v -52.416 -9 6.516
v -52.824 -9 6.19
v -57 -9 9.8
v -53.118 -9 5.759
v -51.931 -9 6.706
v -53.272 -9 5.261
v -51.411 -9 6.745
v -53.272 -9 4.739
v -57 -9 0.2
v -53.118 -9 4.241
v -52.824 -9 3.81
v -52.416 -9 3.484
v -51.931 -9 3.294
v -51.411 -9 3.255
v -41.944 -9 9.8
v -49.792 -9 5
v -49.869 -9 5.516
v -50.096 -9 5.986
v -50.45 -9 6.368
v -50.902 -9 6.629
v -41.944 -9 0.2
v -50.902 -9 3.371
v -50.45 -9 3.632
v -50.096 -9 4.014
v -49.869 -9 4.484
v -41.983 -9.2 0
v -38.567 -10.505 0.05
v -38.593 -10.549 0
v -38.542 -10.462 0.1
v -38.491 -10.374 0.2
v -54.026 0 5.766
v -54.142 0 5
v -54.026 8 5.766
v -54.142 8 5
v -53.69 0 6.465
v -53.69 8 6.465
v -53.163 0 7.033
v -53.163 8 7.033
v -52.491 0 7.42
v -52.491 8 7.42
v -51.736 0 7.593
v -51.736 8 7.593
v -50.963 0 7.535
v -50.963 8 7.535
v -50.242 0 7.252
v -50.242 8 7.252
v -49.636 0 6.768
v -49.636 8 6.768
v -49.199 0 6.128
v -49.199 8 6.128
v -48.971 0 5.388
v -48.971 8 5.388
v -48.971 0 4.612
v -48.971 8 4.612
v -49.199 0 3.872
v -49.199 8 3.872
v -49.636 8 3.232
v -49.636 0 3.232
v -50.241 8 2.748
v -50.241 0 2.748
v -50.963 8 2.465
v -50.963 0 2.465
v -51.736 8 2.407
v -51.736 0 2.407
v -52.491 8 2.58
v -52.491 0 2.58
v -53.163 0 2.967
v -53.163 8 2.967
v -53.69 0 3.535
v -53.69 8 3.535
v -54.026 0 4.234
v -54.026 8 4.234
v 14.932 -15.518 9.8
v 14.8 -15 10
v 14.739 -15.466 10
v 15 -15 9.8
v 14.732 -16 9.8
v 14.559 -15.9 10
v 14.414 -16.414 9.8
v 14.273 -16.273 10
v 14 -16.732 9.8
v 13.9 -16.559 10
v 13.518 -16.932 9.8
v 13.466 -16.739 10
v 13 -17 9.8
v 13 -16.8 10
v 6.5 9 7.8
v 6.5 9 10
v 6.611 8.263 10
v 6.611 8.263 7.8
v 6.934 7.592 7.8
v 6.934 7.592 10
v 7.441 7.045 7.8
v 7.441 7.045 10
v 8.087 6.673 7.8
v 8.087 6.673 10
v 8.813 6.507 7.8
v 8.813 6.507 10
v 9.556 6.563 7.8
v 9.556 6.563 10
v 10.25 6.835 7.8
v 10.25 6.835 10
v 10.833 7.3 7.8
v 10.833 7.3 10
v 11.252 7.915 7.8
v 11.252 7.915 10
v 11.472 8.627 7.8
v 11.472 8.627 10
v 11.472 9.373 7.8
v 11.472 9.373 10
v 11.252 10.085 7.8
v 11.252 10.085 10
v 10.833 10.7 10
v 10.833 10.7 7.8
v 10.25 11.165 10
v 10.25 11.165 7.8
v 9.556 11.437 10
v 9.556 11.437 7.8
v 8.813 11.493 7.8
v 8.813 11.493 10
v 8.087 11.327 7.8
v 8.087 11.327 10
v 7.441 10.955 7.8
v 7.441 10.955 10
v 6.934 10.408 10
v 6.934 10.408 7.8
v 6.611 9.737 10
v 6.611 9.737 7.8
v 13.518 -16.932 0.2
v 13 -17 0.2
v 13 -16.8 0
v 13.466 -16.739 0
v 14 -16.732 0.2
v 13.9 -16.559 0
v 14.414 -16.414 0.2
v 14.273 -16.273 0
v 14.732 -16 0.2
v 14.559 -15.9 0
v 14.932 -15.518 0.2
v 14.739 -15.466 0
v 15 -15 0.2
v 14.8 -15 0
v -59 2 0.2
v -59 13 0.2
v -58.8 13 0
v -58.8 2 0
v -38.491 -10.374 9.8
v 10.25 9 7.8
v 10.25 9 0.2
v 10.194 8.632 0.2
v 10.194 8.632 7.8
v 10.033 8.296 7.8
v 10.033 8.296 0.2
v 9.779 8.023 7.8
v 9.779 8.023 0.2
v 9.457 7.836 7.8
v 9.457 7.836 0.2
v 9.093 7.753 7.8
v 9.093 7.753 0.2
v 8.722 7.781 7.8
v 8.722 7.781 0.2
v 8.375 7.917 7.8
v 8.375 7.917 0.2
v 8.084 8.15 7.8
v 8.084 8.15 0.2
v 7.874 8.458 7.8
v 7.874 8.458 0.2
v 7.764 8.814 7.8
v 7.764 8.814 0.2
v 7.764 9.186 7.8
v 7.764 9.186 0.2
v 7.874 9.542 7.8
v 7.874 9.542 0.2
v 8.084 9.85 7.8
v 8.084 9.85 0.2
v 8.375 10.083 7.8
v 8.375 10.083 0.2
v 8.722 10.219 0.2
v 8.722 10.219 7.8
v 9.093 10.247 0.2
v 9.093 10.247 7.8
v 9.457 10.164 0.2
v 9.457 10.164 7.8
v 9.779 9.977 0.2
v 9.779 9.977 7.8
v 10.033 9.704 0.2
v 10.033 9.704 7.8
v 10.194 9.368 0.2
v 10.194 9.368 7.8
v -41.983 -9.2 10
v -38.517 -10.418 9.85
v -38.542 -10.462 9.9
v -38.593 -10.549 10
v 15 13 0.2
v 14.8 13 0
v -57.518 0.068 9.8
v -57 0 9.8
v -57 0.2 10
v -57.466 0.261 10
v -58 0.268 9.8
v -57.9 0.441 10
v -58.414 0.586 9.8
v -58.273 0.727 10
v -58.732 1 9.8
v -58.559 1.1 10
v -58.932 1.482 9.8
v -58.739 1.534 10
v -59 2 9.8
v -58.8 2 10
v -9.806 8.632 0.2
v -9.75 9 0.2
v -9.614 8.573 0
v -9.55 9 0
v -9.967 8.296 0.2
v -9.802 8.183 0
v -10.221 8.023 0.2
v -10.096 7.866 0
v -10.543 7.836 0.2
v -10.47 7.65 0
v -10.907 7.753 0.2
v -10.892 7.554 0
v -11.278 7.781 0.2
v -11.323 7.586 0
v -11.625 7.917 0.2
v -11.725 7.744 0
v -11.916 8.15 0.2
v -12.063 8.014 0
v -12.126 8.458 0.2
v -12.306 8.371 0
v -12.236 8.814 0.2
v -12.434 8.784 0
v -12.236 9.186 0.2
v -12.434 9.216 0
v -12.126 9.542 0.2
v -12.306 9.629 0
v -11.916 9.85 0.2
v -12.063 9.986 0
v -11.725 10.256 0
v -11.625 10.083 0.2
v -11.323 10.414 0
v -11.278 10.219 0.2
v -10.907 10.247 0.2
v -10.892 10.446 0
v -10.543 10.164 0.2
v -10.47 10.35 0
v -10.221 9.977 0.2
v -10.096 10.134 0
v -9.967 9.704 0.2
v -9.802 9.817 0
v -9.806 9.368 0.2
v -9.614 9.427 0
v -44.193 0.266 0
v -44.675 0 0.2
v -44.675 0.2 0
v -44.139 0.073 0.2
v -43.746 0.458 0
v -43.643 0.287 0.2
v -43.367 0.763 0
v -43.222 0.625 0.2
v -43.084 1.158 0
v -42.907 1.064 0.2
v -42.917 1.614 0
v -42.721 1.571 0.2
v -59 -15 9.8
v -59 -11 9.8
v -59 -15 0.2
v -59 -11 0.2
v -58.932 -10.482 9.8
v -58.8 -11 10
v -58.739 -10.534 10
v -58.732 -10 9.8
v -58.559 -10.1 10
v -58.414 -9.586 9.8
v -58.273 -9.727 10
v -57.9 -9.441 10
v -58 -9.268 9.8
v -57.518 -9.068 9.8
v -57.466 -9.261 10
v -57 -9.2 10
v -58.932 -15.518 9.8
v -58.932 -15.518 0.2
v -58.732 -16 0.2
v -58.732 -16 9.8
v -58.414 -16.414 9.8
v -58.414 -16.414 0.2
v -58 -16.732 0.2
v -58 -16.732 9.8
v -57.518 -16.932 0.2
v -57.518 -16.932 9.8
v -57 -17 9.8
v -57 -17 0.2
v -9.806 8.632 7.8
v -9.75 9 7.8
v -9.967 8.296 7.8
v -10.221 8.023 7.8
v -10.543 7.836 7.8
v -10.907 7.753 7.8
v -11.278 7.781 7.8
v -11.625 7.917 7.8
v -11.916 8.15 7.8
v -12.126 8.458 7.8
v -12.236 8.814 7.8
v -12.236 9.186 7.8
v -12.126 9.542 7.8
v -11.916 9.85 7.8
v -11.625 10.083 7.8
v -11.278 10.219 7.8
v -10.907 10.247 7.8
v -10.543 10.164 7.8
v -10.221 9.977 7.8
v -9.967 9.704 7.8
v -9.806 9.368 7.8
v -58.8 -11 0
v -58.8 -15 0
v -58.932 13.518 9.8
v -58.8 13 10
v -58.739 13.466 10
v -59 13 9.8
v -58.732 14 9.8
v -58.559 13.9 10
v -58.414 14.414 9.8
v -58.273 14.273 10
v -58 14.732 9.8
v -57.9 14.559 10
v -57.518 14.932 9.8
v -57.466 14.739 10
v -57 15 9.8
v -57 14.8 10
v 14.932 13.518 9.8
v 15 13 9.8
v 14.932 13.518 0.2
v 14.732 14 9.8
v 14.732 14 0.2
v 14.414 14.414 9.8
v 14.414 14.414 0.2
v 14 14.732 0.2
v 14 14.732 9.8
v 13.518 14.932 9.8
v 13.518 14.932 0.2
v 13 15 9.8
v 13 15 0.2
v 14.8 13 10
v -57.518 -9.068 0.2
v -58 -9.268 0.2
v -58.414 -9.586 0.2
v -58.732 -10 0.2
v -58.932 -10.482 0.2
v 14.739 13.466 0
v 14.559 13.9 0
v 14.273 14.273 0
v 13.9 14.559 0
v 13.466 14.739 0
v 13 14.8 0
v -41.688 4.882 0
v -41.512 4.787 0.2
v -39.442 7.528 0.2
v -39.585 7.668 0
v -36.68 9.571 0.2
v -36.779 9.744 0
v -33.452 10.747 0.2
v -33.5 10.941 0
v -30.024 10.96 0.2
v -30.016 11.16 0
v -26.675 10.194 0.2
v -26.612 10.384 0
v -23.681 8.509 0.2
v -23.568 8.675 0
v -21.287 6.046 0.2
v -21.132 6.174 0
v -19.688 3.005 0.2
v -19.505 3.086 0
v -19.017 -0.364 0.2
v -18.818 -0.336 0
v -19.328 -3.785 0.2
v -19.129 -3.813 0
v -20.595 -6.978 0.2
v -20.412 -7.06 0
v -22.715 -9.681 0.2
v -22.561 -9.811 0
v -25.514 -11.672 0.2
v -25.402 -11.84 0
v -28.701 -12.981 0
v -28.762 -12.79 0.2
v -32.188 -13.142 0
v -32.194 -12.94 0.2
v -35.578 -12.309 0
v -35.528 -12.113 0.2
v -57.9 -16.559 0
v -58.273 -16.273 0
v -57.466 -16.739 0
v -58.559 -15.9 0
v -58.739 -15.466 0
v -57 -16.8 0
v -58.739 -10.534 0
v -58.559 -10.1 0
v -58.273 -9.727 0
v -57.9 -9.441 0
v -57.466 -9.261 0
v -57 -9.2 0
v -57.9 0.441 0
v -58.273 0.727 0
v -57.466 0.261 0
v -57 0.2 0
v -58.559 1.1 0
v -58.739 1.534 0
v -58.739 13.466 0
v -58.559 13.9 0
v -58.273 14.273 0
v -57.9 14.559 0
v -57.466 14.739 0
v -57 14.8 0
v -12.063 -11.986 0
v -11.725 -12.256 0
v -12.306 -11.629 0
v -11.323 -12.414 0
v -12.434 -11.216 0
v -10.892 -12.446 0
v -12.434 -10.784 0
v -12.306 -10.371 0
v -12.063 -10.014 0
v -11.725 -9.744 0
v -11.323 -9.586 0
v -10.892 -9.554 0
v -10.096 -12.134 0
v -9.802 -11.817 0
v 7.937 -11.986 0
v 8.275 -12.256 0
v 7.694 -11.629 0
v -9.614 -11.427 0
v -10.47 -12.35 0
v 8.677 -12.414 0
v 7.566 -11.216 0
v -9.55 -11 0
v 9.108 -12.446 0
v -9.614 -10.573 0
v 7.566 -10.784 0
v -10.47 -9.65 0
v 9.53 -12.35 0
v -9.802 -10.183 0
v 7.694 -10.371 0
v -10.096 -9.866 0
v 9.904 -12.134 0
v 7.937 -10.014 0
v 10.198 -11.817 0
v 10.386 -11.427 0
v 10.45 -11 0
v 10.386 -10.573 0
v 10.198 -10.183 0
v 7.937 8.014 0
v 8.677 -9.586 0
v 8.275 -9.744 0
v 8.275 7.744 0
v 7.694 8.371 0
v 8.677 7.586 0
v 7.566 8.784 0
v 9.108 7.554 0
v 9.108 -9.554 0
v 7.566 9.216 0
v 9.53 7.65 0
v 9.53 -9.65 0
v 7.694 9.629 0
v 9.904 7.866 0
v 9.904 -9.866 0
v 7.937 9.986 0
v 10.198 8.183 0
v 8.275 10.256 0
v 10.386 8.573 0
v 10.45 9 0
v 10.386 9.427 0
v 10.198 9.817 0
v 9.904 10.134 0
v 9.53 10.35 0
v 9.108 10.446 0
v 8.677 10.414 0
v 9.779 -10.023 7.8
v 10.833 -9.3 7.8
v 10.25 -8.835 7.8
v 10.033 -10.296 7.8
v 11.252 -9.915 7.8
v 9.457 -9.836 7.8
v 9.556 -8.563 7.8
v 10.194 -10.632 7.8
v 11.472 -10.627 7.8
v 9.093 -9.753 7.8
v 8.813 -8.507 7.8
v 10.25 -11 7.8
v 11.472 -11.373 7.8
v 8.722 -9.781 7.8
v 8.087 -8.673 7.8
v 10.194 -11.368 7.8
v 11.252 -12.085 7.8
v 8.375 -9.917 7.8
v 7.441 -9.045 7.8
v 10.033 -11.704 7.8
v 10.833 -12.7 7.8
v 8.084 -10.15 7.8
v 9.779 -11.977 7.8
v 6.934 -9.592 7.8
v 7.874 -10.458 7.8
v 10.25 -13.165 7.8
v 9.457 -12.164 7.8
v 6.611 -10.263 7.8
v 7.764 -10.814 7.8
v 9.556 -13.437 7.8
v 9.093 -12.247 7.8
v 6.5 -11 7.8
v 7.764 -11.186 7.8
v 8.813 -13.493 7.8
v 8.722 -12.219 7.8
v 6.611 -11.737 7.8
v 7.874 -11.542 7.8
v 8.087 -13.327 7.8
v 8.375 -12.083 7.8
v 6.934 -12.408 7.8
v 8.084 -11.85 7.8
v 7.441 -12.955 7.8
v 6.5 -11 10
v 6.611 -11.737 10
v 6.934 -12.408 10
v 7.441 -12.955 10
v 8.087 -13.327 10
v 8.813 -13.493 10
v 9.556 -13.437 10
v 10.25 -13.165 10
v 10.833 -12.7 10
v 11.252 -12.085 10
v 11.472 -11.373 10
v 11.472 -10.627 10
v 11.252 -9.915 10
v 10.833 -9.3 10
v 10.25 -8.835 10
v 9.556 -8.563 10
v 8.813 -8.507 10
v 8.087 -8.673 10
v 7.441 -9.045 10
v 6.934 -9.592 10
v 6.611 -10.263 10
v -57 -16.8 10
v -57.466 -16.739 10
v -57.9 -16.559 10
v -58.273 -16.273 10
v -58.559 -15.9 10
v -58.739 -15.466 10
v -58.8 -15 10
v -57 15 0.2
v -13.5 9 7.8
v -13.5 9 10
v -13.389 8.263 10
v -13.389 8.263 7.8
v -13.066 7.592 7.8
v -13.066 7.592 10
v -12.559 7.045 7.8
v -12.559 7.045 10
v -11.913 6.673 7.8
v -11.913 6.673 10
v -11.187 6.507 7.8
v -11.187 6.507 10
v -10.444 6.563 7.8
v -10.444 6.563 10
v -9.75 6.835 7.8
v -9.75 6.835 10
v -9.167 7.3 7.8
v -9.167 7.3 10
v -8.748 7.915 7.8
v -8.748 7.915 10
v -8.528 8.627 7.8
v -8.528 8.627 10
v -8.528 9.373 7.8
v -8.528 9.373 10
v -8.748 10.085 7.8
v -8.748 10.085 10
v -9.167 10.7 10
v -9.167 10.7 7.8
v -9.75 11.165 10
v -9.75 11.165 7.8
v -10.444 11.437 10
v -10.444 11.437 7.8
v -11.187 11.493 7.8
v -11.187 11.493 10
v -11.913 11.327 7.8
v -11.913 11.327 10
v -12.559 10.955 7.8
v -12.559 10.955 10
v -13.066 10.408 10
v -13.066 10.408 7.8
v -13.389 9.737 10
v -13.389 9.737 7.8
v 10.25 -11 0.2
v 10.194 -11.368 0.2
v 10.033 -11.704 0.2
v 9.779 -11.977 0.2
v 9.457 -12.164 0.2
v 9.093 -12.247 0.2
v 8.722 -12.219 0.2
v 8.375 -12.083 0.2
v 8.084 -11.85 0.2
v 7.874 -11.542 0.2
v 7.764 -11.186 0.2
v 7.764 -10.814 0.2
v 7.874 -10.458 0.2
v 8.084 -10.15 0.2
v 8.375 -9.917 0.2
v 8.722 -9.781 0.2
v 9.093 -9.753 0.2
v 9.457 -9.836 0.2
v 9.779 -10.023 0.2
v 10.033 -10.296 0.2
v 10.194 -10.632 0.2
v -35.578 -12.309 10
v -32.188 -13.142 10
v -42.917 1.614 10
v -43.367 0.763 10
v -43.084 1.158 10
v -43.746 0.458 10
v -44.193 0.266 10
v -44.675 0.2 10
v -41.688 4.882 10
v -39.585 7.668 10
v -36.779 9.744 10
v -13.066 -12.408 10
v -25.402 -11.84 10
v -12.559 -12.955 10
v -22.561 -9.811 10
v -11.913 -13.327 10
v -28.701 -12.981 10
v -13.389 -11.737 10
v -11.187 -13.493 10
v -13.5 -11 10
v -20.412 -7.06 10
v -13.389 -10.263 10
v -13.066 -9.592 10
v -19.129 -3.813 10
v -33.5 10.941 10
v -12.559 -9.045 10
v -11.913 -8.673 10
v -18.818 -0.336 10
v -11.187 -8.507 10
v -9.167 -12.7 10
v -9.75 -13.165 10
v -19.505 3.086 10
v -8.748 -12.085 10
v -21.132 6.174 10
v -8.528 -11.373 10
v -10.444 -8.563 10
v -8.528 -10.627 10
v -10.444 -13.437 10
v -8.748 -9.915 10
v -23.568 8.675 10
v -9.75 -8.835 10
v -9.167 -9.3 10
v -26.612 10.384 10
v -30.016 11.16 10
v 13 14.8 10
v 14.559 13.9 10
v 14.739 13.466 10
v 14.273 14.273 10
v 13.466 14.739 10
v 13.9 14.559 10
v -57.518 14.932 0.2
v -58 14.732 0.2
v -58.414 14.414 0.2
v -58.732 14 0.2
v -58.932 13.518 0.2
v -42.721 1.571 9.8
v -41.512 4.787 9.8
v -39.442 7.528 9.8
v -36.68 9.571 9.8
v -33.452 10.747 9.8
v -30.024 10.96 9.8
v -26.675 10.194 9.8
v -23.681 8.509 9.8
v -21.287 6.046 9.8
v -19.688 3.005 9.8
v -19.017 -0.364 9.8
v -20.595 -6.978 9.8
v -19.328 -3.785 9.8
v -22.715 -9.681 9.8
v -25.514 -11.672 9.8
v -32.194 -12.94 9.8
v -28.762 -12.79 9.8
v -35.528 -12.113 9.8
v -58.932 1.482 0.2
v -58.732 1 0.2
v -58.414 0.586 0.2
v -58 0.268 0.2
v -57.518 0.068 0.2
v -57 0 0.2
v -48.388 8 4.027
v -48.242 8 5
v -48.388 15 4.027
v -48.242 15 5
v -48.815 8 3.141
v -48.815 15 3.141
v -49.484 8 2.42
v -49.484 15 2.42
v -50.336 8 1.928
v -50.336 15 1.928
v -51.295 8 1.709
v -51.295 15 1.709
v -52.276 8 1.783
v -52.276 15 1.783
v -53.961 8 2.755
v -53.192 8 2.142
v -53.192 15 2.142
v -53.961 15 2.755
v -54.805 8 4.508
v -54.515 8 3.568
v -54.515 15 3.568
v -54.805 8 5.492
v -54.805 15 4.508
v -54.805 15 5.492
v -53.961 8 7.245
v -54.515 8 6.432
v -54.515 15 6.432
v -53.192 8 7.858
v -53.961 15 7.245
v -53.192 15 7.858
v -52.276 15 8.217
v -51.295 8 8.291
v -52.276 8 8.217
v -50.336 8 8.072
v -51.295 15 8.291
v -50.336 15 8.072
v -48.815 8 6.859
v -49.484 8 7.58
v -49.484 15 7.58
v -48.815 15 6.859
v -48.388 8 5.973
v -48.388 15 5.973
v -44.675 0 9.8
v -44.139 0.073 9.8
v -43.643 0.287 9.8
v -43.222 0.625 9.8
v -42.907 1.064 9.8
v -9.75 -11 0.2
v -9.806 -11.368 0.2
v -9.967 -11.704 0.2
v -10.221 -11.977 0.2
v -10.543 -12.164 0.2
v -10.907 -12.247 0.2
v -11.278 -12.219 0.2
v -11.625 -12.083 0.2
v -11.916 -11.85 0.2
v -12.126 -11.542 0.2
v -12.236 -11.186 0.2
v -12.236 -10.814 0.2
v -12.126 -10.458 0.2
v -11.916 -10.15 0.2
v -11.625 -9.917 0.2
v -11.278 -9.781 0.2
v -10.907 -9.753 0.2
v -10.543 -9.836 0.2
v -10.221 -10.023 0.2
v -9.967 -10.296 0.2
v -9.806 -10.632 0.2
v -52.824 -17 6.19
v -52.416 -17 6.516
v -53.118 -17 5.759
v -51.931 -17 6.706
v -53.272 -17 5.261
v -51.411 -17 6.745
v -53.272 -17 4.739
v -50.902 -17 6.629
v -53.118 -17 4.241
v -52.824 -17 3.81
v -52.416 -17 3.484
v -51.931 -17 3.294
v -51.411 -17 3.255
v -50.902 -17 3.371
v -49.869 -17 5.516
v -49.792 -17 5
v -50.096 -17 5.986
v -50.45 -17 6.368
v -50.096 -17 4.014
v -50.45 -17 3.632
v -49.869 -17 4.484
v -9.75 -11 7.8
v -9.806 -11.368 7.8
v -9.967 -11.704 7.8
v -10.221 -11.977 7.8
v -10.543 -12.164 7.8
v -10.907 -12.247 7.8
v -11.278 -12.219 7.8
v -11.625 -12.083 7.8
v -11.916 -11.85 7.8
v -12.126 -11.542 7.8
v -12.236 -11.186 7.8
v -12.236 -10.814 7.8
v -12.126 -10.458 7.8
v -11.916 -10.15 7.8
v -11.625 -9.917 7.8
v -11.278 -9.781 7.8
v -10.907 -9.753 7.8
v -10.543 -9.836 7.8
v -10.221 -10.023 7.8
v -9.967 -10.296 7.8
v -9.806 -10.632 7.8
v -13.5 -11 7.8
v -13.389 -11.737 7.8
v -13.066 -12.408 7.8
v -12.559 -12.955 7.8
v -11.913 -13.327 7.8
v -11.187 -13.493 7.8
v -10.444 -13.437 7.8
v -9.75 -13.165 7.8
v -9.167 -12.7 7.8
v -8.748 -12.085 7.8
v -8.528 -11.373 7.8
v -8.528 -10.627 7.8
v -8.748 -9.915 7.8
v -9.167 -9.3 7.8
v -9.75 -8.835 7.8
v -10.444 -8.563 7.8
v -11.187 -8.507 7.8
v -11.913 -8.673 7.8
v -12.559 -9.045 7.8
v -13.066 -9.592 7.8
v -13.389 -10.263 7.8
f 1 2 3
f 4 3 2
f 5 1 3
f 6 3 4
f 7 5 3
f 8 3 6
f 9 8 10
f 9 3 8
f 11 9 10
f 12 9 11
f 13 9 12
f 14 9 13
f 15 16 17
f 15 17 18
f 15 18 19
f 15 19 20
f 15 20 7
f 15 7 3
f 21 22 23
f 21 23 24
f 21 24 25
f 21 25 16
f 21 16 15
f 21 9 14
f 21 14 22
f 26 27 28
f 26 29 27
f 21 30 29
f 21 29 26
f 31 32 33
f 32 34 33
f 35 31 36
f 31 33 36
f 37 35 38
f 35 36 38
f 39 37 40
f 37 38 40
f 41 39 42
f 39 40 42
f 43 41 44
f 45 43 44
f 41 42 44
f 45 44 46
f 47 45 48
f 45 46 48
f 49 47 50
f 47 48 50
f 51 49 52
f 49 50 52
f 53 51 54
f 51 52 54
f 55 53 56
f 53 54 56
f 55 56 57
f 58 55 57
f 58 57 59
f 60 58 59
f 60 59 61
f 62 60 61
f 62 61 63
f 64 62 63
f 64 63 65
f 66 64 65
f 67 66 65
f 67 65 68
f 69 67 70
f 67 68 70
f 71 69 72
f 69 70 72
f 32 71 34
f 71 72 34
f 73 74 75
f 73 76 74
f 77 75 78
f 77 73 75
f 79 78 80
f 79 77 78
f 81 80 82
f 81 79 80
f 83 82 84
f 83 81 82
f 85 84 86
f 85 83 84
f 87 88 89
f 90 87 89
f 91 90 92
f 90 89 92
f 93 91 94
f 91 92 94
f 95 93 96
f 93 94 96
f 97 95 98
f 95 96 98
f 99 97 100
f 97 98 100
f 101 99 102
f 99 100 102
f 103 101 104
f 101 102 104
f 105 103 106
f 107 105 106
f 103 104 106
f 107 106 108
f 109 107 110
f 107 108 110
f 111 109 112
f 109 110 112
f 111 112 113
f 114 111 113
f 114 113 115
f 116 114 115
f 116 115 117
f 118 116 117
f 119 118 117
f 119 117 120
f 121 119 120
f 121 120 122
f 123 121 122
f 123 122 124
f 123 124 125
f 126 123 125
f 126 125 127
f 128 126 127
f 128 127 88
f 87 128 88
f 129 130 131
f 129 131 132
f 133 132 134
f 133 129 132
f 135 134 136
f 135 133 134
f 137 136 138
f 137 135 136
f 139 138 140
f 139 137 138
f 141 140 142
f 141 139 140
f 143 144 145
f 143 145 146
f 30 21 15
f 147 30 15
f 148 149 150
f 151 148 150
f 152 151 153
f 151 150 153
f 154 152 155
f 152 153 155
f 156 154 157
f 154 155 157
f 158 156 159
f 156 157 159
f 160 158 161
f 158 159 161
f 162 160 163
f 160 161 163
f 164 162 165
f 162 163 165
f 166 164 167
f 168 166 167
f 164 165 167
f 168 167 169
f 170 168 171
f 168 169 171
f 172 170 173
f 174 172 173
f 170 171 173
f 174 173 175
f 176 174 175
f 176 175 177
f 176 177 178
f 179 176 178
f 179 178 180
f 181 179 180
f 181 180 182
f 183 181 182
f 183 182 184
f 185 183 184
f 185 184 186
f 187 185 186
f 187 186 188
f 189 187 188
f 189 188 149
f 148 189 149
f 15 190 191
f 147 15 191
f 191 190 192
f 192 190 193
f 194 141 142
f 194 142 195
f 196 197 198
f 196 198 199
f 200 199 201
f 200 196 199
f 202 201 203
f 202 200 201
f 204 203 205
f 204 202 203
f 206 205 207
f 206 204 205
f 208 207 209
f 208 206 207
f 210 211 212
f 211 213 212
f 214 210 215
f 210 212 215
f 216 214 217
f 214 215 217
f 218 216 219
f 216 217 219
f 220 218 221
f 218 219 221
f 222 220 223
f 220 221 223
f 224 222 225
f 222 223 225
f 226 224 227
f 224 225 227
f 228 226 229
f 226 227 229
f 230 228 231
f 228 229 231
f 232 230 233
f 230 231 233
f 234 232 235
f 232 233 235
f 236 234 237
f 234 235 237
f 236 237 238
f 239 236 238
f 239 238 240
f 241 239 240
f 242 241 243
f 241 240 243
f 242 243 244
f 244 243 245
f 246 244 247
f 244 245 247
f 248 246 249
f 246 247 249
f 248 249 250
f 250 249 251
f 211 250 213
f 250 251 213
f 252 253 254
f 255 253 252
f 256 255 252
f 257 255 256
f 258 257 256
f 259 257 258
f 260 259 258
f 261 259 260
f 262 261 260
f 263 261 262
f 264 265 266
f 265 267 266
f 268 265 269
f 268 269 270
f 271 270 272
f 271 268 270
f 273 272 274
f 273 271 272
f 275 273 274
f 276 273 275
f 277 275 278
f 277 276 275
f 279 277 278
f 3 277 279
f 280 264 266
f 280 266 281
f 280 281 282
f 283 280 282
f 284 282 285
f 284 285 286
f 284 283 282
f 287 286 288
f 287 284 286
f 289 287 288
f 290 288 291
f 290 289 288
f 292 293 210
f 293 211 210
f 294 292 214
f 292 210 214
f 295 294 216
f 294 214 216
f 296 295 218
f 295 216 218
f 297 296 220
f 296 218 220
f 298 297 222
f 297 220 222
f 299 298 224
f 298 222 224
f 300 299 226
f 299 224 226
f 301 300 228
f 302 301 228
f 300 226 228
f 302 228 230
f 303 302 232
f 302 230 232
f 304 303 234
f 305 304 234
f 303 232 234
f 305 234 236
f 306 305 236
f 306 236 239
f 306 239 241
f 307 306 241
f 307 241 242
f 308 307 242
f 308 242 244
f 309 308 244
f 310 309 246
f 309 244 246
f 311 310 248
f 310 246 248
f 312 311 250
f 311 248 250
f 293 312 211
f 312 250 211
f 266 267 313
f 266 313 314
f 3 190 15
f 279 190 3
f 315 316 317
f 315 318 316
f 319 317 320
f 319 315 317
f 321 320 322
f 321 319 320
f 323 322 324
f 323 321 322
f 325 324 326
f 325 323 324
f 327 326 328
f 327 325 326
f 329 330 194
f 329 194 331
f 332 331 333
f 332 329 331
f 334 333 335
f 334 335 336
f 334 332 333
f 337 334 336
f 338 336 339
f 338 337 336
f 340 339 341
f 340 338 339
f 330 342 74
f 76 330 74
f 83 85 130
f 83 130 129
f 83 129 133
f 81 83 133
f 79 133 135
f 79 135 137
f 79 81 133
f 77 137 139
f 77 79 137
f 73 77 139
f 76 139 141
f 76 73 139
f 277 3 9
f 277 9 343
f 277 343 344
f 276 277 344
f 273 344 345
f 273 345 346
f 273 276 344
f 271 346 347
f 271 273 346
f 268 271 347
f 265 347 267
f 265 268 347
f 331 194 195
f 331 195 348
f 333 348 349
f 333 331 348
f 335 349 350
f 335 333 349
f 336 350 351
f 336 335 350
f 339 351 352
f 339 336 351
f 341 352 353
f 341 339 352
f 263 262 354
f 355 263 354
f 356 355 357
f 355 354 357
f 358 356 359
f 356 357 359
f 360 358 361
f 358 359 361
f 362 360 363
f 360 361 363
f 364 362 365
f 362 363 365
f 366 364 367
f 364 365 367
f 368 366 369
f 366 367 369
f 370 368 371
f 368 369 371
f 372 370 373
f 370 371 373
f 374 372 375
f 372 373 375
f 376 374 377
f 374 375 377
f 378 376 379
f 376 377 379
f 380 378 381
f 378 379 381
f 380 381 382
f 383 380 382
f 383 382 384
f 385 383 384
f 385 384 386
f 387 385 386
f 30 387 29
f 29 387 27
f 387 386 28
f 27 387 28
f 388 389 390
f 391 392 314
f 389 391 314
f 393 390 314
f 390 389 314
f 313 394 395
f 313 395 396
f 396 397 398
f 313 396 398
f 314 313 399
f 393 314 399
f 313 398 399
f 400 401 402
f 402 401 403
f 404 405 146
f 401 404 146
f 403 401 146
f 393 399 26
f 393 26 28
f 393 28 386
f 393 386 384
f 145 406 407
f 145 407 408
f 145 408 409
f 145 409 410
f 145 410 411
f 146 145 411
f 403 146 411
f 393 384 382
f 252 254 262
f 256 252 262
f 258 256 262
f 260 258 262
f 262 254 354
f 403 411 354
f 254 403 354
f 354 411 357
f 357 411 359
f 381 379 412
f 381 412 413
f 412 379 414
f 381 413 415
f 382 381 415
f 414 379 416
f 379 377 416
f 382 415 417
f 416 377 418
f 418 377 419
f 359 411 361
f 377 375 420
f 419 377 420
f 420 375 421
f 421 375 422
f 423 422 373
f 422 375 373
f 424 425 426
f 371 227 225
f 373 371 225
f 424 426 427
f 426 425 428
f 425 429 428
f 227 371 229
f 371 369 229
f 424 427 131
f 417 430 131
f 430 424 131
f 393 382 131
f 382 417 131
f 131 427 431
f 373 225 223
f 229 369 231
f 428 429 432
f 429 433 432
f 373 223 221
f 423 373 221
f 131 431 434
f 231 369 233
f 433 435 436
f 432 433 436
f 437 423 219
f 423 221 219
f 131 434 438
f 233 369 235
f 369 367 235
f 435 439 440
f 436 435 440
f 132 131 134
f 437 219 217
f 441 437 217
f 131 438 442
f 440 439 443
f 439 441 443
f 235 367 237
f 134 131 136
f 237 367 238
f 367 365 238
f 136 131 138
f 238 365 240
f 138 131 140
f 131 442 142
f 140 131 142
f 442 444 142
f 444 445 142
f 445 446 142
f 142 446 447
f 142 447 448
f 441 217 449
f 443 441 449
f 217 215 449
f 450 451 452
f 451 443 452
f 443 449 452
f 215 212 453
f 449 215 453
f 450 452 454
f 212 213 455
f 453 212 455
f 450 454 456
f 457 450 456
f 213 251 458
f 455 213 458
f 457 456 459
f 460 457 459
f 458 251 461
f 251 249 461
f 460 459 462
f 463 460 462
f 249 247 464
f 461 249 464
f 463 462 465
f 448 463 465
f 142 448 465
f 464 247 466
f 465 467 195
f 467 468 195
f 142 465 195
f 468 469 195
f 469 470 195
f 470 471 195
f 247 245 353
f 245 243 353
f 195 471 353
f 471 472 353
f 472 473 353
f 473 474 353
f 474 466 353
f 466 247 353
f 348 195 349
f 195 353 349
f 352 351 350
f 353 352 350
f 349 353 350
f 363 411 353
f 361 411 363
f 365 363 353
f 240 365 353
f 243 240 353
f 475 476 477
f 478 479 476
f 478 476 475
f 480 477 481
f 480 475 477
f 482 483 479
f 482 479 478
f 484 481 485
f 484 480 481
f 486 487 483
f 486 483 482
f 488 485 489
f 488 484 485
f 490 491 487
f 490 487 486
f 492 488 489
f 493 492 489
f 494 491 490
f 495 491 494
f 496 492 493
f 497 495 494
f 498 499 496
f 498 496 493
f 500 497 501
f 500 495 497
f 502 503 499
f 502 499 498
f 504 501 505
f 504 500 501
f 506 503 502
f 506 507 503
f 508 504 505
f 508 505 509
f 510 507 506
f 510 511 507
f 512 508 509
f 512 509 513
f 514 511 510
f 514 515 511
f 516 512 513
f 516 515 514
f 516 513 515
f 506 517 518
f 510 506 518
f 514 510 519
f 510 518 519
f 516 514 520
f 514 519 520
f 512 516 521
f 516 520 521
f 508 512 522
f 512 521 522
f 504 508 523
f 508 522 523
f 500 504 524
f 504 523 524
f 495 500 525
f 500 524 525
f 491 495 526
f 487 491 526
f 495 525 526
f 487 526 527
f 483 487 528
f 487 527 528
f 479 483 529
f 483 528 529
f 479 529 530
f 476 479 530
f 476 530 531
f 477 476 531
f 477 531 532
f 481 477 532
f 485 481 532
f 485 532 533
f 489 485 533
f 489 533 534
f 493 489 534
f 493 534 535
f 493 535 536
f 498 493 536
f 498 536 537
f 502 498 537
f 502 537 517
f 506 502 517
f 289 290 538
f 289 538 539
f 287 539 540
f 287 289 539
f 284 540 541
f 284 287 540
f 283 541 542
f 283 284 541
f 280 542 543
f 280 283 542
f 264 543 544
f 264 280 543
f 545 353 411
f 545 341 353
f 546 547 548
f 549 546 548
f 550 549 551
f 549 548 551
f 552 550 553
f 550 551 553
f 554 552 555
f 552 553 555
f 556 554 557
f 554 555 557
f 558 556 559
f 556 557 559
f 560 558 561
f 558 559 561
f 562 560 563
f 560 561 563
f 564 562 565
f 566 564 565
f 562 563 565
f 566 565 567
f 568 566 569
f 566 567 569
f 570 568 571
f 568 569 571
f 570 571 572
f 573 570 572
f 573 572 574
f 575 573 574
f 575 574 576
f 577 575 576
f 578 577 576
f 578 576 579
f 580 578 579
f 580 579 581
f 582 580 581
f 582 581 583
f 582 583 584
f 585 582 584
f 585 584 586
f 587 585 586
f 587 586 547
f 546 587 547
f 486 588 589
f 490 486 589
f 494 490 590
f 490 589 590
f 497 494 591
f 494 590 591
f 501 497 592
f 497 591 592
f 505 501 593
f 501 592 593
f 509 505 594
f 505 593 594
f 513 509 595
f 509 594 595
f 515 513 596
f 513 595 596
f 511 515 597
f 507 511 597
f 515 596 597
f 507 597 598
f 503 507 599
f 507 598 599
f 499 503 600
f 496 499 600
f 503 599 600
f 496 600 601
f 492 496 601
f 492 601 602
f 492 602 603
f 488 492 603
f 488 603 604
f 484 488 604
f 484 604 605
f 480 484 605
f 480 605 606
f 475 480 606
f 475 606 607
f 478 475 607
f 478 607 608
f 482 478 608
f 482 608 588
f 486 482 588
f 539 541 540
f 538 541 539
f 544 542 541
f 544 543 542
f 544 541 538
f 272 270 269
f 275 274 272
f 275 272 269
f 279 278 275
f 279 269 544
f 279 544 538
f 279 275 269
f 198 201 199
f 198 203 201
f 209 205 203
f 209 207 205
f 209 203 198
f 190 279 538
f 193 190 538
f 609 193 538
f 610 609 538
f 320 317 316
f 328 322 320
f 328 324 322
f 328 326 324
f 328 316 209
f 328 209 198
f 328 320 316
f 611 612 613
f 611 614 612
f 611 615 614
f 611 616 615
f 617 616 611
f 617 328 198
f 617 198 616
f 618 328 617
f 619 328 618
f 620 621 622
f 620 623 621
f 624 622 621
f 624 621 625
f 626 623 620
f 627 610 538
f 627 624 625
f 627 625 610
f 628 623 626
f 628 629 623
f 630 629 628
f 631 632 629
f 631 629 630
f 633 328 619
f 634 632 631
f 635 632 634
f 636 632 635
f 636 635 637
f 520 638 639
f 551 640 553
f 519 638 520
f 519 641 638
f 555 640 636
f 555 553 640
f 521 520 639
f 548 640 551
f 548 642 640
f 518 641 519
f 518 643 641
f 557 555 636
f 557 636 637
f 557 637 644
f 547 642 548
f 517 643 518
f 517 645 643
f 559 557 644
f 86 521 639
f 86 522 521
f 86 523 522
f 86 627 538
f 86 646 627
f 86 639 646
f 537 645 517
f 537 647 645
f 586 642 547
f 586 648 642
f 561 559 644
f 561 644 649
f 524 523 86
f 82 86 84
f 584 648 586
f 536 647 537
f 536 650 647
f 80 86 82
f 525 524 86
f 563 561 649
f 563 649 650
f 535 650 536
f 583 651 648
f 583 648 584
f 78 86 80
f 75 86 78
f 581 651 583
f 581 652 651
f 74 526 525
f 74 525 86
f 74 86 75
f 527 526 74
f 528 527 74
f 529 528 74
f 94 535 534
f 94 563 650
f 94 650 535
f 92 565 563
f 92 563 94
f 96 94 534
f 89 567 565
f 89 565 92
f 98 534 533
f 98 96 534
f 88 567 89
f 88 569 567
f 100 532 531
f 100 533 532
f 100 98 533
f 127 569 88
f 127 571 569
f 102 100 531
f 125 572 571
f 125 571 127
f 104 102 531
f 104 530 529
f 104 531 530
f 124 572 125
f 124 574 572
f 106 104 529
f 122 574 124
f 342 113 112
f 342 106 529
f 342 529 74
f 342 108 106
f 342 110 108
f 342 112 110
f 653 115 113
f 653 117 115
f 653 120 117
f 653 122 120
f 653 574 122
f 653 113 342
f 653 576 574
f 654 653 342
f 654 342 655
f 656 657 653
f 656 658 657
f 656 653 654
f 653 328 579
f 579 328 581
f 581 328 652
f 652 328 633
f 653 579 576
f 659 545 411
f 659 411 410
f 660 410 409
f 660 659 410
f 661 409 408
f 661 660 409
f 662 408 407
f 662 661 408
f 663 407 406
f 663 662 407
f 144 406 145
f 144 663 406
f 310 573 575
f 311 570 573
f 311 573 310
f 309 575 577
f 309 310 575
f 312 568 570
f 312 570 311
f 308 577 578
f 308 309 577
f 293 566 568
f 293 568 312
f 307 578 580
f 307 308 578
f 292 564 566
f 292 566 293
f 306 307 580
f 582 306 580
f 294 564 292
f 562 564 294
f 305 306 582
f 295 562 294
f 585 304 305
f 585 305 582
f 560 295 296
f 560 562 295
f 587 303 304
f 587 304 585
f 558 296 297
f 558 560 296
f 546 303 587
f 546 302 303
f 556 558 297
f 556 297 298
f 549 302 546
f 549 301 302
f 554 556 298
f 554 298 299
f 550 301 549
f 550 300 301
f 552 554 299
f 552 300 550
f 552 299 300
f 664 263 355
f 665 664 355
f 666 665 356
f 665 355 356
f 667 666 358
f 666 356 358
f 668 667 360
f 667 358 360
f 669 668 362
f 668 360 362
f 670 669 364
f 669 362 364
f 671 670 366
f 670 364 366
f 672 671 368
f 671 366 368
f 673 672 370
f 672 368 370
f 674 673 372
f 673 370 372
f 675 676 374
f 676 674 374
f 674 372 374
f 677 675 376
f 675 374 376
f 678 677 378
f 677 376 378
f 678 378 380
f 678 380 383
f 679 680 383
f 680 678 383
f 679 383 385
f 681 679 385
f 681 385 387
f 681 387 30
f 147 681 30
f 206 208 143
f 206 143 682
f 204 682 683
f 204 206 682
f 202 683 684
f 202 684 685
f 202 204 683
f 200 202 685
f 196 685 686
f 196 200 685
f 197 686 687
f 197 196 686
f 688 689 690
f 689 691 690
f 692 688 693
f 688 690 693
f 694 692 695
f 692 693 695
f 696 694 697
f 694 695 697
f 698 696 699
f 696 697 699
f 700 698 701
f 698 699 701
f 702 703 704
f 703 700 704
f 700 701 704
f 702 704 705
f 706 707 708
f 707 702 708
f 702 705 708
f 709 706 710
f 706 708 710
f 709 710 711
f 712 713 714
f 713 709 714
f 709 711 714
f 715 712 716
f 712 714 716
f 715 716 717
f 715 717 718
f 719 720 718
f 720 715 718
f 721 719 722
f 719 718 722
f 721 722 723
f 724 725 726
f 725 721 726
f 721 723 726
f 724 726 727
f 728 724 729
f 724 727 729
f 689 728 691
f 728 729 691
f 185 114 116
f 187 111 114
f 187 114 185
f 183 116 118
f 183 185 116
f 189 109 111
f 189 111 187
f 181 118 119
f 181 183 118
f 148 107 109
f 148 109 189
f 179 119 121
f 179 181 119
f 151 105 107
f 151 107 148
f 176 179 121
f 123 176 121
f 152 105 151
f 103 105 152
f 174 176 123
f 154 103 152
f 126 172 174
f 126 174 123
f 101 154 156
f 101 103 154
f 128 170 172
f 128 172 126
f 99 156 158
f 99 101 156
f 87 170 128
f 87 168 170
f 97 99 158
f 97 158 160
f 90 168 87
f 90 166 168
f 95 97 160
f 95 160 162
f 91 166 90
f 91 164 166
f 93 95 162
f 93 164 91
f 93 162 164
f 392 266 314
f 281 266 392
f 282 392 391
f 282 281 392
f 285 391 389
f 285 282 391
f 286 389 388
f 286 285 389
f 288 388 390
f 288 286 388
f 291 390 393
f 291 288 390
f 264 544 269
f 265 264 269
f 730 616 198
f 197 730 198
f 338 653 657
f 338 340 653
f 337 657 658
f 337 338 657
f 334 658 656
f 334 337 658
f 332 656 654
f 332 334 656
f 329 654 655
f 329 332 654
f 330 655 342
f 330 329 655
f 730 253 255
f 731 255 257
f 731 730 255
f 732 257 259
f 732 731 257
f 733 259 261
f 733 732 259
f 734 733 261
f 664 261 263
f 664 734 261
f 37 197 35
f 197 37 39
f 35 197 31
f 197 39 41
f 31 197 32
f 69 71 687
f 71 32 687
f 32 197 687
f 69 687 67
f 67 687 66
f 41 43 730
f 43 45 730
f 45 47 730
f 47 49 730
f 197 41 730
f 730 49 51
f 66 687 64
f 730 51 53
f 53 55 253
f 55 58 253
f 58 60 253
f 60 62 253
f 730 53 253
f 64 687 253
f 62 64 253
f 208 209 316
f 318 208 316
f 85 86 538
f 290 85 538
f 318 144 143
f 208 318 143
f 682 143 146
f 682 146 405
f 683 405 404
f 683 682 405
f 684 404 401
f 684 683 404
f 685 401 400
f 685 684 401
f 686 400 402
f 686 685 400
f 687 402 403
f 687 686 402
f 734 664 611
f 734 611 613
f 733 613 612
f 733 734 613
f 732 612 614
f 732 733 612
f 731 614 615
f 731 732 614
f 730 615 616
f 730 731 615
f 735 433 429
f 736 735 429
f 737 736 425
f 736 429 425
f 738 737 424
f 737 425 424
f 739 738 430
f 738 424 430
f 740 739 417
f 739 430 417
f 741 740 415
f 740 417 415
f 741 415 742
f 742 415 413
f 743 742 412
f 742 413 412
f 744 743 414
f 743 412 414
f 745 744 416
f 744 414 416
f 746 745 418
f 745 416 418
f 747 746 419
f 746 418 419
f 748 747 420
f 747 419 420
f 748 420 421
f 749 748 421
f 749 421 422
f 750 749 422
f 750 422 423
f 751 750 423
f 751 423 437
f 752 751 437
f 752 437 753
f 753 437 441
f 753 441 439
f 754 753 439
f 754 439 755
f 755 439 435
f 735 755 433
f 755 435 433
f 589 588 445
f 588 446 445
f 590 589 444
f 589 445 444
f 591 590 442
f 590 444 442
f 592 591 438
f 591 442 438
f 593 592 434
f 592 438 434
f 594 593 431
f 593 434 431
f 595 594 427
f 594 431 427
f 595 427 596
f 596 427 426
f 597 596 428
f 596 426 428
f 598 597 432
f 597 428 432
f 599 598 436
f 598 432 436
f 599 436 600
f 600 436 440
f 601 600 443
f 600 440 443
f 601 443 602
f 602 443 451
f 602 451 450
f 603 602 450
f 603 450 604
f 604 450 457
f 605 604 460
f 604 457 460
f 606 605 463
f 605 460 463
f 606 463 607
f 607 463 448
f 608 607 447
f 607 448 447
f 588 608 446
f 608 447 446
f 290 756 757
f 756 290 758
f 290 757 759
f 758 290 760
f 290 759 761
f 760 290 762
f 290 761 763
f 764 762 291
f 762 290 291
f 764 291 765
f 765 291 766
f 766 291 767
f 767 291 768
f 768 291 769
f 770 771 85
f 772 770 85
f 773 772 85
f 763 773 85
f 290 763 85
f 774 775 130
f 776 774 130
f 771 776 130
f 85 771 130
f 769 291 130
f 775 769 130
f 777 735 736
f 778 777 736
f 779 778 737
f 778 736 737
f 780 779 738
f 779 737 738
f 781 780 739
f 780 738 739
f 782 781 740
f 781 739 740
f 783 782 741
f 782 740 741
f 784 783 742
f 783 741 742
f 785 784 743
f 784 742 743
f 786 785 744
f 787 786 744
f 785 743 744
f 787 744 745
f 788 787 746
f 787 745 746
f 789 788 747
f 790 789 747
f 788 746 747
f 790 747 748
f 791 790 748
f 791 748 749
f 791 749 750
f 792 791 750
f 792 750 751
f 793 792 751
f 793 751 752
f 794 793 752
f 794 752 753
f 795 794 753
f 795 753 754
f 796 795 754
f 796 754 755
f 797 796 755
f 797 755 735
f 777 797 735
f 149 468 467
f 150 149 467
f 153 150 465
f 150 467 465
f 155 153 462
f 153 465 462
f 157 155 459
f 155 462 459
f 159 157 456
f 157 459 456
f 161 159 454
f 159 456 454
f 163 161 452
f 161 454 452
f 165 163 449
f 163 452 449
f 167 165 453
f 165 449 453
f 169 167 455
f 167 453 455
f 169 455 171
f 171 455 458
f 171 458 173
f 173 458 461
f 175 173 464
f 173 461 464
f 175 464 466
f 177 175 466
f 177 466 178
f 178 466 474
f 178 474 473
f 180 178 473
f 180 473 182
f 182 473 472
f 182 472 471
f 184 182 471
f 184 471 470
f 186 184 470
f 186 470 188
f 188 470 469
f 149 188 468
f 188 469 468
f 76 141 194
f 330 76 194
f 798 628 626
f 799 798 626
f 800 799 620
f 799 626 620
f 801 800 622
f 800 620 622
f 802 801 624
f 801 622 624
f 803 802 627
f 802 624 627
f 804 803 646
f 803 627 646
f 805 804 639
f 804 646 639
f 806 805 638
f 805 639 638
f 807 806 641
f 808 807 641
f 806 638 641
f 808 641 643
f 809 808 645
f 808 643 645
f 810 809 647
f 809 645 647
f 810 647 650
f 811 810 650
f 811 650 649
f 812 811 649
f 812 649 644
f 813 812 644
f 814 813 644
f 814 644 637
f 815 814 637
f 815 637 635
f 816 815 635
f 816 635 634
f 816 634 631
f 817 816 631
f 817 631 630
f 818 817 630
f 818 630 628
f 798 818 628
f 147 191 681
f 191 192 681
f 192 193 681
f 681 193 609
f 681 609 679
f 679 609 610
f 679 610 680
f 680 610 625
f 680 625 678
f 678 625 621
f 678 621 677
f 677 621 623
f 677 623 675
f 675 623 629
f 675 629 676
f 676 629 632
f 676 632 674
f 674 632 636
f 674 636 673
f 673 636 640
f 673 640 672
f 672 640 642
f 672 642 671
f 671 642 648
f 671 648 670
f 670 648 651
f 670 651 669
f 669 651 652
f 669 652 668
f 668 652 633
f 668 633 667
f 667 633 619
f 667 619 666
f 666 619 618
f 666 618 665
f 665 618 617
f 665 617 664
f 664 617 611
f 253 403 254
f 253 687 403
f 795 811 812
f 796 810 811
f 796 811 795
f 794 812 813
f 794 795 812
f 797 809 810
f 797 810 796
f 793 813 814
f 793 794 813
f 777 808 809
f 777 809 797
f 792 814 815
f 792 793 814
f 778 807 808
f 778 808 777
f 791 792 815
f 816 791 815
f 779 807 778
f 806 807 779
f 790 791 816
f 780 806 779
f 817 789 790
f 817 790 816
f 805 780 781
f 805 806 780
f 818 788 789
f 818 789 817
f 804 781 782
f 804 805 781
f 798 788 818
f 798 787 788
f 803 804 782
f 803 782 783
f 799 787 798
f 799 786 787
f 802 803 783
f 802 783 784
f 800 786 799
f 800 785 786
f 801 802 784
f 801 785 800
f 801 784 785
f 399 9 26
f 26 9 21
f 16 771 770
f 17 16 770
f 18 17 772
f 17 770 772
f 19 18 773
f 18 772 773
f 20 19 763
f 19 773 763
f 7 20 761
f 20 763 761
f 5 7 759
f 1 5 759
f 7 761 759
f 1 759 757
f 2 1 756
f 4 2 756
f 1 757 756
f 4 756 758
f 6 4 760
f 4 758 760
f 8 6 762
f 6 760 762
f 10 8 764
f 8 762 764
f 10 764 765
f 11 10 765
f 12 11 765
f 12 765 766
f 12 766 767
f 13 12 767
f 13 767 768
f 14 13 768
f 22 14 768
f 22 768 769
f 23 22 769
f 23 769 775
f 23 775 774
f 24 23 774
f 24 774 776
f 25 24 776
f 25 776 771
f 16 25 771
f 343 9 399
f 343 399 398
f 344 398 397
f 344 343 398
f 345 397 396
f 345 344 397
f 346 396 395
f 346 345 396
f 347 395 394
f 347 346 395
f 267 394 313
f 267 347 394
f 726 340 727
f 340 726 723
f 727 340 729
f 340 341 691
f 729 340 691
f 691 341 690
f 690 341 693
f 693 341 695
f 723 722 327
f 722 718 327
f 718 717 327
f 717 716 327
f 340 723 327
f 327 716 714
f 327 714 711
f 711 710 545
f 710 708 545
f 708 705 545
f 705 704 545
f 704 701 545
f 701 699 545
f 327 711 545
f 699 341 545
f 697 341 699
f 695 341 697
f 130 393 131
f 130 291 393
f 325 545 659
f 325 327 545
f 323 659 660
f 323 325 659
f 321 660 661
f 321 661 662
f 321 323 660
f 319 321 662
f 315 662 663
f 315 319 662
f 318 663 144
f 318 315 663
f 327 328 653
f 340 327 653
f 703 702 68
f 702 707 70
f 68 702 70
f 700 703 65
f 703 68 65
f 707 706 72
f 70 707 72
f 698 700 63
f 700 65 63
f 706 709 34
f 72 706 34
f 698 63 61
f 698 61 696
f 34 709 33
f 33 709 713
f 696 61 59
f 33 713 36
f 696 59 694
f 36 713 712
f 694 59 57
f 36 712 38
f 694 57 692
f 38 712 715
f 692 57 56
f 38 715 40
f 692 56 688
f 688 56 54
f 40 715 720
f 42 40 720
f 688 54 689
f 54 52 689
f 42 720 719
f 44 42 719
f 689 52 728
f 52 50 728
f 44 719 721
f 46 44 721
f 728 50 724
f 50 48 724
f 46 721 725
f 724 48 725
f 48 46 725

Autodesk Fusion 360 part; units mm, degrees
sketch "Base profile and screw holes" plane through (0, 0, 0) normal (0, 0, 1) x (1, 0, 0)
  line L0 (15, 15) -> (-15, 15)
  line L1 (-15, 15) -> (-15, -17)
  line L2 (-15, -17) -> (15, -17)
  line L3 (15, -17) -> (15, 15)
  circle A0 centre (-11, -11) radius 1.25
  circle A1 centre (9, -11) radius 1.25
  circle A2 centre (-11, 9) radius 1.25
  circle A3 centre (9, 9) radius 1.25
  dimension "d1" = 30
  dimension "d5" = 4
  dimension "d8" = 20
  dimension "d9" = 2.5
  dimension "d10" = 20
  dimension "d40" = 11
  dimension "d41" = 6
  dimension "d42" = 6
extrude "Extrude1" add sketch "Base profile and screw holes" along normal blind 10 makes body 1
ref_plane "WorkPlane1" through (0, 0, -30) normal (0, 0, 1) x (1, 0, 0)
sketch "Original holder" plane through (0, 0, -30) normal (0, 0, 1) x (1, 0, 0)
  circle A0 centre (-31, 0) radius 12.75
  circle A1 centre (-11, -11) radius 1.25
  line L0 (-14.1024, 16) -> (-47.8976, 16)
  line L1 (-47.8976, 16) -> (-47.8976, -16)
  line L2 (-47.8976, -16) -> (-14.1024, -16)
  line L3 (-14.1024, -16) -> (-14.1024, 16)
  line L4 (-14.1024, 16) -> (-47.8976, -16) construction
  line L5 (-47.8976, 16) -> (-14.1024, -16) construction
  line L6 (-15, 15) -> (-15, -17)
  point P0 (-31, 0)
  dimension "d16" = 25.5
  dimension "d17" = 20
extrude "Extrude2" add sketch "Original holder" against normal blind 5 separate body contours L0 L1 L2 L3 makes body 2
sketch "Nikon 10x objective" plane through (0, 0, 0) normal (0, 1, 0) x (1, 0, 0)
  line L0 (-43.4233, 29.7385) -> (-30.9233, 29.7385)
  line L1 (-30.9233, 29.7385) -> (-30.9233, 34.7385)
  line L2 (-30.9233, 34.7385) -> (-43.4233, 34.7385)
  line L3 (-43.4233, 34.7385) -> (-43.4233, 29.7385)
  line L4 (-30.9233, 29.7385) -> (-44.9233, 29.7385)
  line L5 (-44.9233, 29.7385) -> (-44.9233, 24.7385)
  line L6 (-44.9233, 24.7385) -> (-30.9233, 24.7385)
  line L7 (-30.9233, 24.7385) -> (-30.9233, 29.7385)
  line L8 (-44.9233, 24.7385) -> (-42.9233, 22.7376)
  line L9 (-44.9233, 24.7385) -> (-39.0718, 24.7385) construction
  line L10 (-30.9233, 24.7385) -> (-42.9233, 24.7385)
  line L11 (-42.9233, 24.7385) -> (-42.9233, -13.2615)
  line L12 (-42.9233, -13.2615) -> (-30.9233, -13.2615)
  line L13 (-30.9233, -13.2615) -> (-30.9233, 24.7385)
  line L14 (-30.9233, -13.2615) -> (-40.1733, -13.2615)
  line L15 (-40.1733, -13.2615) -> (-40.1733, -16.7692)
  line L16 (-30.9233, -17.6525) -> (-30.9233, -13.2615)
  line L17 (-40.1733, -16.7692) -> (-34.1733, -27.1615)
  line L18 (-30.9233, -17.6525) -> (-30.9233, -27.1615)
  line L19 (-34.1733, -27.1615) -> (-30.9233, -27.1615)
  line L20 (-42.9233, -10.9477) -> (-41.5874, -13.2615)
  line L21 (-42.9233, -10.9477) -> (-41.0507, -10.9477) construction
  dimension "d20" = 12.5
  dimension "d21" = 5
  dimension "d22" = 14
  dimension "d23" = 5
  dimension "d26" = 12
  dimension "d29" = 9.25
  dimension "d31" = 3.25
  dimension "d33" = 43
  dimension "d34" = 60
  dimension "d35" = 13.9
  dimension "d36" = 60
revolve "Revolve1" add sketch "Nikon 10x objective" angle 360 about axis through (-30.9233, 0, 13.2615) along (0, 0, -1) separate body contours L0 L1 L2 L3 L4 | L0 L4 L5 L6 L7 L10 | L6 L10 L11 L12 L13 L14 L20 | L6 L8 L11 | L12 L14 L15 L16 L17 L18 L19 makes body 3
sketch "Main body of holder" plane through (0, 0, 0) normal (0, 0, 1) x (1, 0, 0)
  circle A0 centre (-31, -1) radius 12
  line L0 (-11, 9) -> (-11, -11) construction
  line L1 (-15, 15) -> (-59, 15)
  line L2 (-59, 15) -> (-59, -17)
  line L3 (-59, -17) -> (-15, -17)
  line L4 (-15, -17) -> (-15, 15)
  line L5 (-59, -9) -> (-39.9443, -9)
  line L6 (-59, 0) -> (-42.9583, 0)
  point P0 (-11, -11)
  point P1 (-11, 9)
  point P2 (-11, -1)
  point P3 (-15, 15)
  point P4 (-15, -17)
  dimension "d38" = 24
  dimension "d39" = 20
  dimension "d43" = 15
  dimension "d44" = 8
  dimension "d45" = 44
extrude "Extrude3" add sketch "Main body of holder" along normal up to surface (10 mm away) contours A0 L1 L2 L3 L4 L5 L6 bodies 1
sketch "Hole for bolt that goes into heat-set insert" plane through (0, -17, 0) normal (0, -1, 0) x (1, 0, 0)
  line L0 (-59, 0) -> (15, 0)
  line L1 (15, 0) -> (15, 10)
  line L2 (15, 10) -> (-59, 10)
  line L3 (-59, 10) -> (-59, 0)
  circle A0 centre (-51.5415, 5) radius 1.75
  point P0 (-59, 5)
  dimension "d48" = 3.5
extrude "Extrude4" cut sketch "Hole for bolt that goes into heat-set insert" against normal up to surface (8 mm away) contours A0 bodies 1
chamfer "Chamfer1" distance 2 angle 45 1 edges at (-39.9443, -9, 5) on bodies 1
sketch "Hole for heat-set insert" plane through (0, 15, 0) normal (0, 1, 0) x (-1, 0, 0)
  line L0 (-15, 0) -> (59, 0)
  line L1 (59, 0) -> (59, 10)
  line L2 (59, 10) -> (-15, 10)
  line L3 (-15, 10) -> (-15, 0)
  circle A0 centre (51.5415, 5) radius 2.6
  circle A1 centre (51.5415, 5) radius 1.75
  dimension "d52" = 5.2
extrude "Extrude5" cut sketch "Hole for heat-set insert" against normal up to surface (15 mm away) contours A0 | A1 bodies 1
fillet "Fillet3" radius 2 7 edges at (-59, 15, 5) (-59, 0, 5) (-59, -9, 5) (-59, -17, 5) (-42.9583, 0, 5) (15, -17, 5) (15, 15, 5) on bodies 1
chamfer "Chamfer2" distance 0.2 angle 45 34 edges at (-22, 15, 10) (14.4142, 14.4142, 10) (15, -1, 10) (14.4142, -16.4142, 10) (-22, -17, 10) (-58.4142, -16.4142, 10) (-59, -13, 10) (-58.4142, -9.5858, 10) (-49.4721, -9, 10) (-19.6882, 3.0054, 10) (-43.4212, 0.4416, 10) (-50.8374, 0, 10) (-58.4142, 0.5858, 10) (-59, 7.5, 10) (-58.4142, 14.4142, 10) (-22, 15, 0) (14.4142, 14.4142, 0) (15, -1, 0) (14.4142, -16.4142, 0) (-22, -17, 0) (-58.4142, -16.4142, 0) (-59, -13, 0) (-58.4142, -9.5858, 0) (-49.4721, -9, 0) (-19.6882, 3.0054, 0) (-43.4212, 0.4416, 0) (-50.8374, 0, 0) (-58.4142, 0.5858, 0) (-59, 7.5, 0) (-58.4142, 14.4142, 0) (-12.1654, -10.548, 0) (-12.1654, 9.452, 0) (7.8346, 9.452, 0) (7.8346, -10.548, 0) on bodies 1
chamfer "Chamfer2" distance 0.2 angle 45 2 edges at (-40.2178, -9.6872, 0) (-40.2178, -9.6872, 10) on bodies 1
sketch "Counterbore for bolts that attach to microscope stage" plane through (0, 0, 10) normal (0, 0, 1) x (-1, 0, 0)
  circle A0 centre (11, -9) radius 2.5
  circle A1 centre (-9, -9) radius 2.5
  circle A2 centre (11, 11) radius 2.5
  circle A3 centre (-9, 11) radius 2.5
  point P0 (11, -9)
  point P1 (-9, -9)
  point P2 (-9, 11)
  point P3 (11, 11)
  dimension "d62" = 5
extrude "Extrude6" cut sketch "Counterbore for bolts that attach to microscope stage" against normal blind 2.2 bodies 1
sketch "Counterbore for bolt that goes into the heat-set insert" plane through (0, 15, 0) normal (0, -1, 0) x (1, 0, 0)
  circle A0 centre (-51.5415, 5) radius 3.3
  point P0 (-51.5415, 5)
  dimension "d65" = 6.6
extrude "Extrude8" cut sketch "Counterbore for bolt that goes into the heat-set insert" along normal blind 7 bodies 1
hidden bodies 2 3
